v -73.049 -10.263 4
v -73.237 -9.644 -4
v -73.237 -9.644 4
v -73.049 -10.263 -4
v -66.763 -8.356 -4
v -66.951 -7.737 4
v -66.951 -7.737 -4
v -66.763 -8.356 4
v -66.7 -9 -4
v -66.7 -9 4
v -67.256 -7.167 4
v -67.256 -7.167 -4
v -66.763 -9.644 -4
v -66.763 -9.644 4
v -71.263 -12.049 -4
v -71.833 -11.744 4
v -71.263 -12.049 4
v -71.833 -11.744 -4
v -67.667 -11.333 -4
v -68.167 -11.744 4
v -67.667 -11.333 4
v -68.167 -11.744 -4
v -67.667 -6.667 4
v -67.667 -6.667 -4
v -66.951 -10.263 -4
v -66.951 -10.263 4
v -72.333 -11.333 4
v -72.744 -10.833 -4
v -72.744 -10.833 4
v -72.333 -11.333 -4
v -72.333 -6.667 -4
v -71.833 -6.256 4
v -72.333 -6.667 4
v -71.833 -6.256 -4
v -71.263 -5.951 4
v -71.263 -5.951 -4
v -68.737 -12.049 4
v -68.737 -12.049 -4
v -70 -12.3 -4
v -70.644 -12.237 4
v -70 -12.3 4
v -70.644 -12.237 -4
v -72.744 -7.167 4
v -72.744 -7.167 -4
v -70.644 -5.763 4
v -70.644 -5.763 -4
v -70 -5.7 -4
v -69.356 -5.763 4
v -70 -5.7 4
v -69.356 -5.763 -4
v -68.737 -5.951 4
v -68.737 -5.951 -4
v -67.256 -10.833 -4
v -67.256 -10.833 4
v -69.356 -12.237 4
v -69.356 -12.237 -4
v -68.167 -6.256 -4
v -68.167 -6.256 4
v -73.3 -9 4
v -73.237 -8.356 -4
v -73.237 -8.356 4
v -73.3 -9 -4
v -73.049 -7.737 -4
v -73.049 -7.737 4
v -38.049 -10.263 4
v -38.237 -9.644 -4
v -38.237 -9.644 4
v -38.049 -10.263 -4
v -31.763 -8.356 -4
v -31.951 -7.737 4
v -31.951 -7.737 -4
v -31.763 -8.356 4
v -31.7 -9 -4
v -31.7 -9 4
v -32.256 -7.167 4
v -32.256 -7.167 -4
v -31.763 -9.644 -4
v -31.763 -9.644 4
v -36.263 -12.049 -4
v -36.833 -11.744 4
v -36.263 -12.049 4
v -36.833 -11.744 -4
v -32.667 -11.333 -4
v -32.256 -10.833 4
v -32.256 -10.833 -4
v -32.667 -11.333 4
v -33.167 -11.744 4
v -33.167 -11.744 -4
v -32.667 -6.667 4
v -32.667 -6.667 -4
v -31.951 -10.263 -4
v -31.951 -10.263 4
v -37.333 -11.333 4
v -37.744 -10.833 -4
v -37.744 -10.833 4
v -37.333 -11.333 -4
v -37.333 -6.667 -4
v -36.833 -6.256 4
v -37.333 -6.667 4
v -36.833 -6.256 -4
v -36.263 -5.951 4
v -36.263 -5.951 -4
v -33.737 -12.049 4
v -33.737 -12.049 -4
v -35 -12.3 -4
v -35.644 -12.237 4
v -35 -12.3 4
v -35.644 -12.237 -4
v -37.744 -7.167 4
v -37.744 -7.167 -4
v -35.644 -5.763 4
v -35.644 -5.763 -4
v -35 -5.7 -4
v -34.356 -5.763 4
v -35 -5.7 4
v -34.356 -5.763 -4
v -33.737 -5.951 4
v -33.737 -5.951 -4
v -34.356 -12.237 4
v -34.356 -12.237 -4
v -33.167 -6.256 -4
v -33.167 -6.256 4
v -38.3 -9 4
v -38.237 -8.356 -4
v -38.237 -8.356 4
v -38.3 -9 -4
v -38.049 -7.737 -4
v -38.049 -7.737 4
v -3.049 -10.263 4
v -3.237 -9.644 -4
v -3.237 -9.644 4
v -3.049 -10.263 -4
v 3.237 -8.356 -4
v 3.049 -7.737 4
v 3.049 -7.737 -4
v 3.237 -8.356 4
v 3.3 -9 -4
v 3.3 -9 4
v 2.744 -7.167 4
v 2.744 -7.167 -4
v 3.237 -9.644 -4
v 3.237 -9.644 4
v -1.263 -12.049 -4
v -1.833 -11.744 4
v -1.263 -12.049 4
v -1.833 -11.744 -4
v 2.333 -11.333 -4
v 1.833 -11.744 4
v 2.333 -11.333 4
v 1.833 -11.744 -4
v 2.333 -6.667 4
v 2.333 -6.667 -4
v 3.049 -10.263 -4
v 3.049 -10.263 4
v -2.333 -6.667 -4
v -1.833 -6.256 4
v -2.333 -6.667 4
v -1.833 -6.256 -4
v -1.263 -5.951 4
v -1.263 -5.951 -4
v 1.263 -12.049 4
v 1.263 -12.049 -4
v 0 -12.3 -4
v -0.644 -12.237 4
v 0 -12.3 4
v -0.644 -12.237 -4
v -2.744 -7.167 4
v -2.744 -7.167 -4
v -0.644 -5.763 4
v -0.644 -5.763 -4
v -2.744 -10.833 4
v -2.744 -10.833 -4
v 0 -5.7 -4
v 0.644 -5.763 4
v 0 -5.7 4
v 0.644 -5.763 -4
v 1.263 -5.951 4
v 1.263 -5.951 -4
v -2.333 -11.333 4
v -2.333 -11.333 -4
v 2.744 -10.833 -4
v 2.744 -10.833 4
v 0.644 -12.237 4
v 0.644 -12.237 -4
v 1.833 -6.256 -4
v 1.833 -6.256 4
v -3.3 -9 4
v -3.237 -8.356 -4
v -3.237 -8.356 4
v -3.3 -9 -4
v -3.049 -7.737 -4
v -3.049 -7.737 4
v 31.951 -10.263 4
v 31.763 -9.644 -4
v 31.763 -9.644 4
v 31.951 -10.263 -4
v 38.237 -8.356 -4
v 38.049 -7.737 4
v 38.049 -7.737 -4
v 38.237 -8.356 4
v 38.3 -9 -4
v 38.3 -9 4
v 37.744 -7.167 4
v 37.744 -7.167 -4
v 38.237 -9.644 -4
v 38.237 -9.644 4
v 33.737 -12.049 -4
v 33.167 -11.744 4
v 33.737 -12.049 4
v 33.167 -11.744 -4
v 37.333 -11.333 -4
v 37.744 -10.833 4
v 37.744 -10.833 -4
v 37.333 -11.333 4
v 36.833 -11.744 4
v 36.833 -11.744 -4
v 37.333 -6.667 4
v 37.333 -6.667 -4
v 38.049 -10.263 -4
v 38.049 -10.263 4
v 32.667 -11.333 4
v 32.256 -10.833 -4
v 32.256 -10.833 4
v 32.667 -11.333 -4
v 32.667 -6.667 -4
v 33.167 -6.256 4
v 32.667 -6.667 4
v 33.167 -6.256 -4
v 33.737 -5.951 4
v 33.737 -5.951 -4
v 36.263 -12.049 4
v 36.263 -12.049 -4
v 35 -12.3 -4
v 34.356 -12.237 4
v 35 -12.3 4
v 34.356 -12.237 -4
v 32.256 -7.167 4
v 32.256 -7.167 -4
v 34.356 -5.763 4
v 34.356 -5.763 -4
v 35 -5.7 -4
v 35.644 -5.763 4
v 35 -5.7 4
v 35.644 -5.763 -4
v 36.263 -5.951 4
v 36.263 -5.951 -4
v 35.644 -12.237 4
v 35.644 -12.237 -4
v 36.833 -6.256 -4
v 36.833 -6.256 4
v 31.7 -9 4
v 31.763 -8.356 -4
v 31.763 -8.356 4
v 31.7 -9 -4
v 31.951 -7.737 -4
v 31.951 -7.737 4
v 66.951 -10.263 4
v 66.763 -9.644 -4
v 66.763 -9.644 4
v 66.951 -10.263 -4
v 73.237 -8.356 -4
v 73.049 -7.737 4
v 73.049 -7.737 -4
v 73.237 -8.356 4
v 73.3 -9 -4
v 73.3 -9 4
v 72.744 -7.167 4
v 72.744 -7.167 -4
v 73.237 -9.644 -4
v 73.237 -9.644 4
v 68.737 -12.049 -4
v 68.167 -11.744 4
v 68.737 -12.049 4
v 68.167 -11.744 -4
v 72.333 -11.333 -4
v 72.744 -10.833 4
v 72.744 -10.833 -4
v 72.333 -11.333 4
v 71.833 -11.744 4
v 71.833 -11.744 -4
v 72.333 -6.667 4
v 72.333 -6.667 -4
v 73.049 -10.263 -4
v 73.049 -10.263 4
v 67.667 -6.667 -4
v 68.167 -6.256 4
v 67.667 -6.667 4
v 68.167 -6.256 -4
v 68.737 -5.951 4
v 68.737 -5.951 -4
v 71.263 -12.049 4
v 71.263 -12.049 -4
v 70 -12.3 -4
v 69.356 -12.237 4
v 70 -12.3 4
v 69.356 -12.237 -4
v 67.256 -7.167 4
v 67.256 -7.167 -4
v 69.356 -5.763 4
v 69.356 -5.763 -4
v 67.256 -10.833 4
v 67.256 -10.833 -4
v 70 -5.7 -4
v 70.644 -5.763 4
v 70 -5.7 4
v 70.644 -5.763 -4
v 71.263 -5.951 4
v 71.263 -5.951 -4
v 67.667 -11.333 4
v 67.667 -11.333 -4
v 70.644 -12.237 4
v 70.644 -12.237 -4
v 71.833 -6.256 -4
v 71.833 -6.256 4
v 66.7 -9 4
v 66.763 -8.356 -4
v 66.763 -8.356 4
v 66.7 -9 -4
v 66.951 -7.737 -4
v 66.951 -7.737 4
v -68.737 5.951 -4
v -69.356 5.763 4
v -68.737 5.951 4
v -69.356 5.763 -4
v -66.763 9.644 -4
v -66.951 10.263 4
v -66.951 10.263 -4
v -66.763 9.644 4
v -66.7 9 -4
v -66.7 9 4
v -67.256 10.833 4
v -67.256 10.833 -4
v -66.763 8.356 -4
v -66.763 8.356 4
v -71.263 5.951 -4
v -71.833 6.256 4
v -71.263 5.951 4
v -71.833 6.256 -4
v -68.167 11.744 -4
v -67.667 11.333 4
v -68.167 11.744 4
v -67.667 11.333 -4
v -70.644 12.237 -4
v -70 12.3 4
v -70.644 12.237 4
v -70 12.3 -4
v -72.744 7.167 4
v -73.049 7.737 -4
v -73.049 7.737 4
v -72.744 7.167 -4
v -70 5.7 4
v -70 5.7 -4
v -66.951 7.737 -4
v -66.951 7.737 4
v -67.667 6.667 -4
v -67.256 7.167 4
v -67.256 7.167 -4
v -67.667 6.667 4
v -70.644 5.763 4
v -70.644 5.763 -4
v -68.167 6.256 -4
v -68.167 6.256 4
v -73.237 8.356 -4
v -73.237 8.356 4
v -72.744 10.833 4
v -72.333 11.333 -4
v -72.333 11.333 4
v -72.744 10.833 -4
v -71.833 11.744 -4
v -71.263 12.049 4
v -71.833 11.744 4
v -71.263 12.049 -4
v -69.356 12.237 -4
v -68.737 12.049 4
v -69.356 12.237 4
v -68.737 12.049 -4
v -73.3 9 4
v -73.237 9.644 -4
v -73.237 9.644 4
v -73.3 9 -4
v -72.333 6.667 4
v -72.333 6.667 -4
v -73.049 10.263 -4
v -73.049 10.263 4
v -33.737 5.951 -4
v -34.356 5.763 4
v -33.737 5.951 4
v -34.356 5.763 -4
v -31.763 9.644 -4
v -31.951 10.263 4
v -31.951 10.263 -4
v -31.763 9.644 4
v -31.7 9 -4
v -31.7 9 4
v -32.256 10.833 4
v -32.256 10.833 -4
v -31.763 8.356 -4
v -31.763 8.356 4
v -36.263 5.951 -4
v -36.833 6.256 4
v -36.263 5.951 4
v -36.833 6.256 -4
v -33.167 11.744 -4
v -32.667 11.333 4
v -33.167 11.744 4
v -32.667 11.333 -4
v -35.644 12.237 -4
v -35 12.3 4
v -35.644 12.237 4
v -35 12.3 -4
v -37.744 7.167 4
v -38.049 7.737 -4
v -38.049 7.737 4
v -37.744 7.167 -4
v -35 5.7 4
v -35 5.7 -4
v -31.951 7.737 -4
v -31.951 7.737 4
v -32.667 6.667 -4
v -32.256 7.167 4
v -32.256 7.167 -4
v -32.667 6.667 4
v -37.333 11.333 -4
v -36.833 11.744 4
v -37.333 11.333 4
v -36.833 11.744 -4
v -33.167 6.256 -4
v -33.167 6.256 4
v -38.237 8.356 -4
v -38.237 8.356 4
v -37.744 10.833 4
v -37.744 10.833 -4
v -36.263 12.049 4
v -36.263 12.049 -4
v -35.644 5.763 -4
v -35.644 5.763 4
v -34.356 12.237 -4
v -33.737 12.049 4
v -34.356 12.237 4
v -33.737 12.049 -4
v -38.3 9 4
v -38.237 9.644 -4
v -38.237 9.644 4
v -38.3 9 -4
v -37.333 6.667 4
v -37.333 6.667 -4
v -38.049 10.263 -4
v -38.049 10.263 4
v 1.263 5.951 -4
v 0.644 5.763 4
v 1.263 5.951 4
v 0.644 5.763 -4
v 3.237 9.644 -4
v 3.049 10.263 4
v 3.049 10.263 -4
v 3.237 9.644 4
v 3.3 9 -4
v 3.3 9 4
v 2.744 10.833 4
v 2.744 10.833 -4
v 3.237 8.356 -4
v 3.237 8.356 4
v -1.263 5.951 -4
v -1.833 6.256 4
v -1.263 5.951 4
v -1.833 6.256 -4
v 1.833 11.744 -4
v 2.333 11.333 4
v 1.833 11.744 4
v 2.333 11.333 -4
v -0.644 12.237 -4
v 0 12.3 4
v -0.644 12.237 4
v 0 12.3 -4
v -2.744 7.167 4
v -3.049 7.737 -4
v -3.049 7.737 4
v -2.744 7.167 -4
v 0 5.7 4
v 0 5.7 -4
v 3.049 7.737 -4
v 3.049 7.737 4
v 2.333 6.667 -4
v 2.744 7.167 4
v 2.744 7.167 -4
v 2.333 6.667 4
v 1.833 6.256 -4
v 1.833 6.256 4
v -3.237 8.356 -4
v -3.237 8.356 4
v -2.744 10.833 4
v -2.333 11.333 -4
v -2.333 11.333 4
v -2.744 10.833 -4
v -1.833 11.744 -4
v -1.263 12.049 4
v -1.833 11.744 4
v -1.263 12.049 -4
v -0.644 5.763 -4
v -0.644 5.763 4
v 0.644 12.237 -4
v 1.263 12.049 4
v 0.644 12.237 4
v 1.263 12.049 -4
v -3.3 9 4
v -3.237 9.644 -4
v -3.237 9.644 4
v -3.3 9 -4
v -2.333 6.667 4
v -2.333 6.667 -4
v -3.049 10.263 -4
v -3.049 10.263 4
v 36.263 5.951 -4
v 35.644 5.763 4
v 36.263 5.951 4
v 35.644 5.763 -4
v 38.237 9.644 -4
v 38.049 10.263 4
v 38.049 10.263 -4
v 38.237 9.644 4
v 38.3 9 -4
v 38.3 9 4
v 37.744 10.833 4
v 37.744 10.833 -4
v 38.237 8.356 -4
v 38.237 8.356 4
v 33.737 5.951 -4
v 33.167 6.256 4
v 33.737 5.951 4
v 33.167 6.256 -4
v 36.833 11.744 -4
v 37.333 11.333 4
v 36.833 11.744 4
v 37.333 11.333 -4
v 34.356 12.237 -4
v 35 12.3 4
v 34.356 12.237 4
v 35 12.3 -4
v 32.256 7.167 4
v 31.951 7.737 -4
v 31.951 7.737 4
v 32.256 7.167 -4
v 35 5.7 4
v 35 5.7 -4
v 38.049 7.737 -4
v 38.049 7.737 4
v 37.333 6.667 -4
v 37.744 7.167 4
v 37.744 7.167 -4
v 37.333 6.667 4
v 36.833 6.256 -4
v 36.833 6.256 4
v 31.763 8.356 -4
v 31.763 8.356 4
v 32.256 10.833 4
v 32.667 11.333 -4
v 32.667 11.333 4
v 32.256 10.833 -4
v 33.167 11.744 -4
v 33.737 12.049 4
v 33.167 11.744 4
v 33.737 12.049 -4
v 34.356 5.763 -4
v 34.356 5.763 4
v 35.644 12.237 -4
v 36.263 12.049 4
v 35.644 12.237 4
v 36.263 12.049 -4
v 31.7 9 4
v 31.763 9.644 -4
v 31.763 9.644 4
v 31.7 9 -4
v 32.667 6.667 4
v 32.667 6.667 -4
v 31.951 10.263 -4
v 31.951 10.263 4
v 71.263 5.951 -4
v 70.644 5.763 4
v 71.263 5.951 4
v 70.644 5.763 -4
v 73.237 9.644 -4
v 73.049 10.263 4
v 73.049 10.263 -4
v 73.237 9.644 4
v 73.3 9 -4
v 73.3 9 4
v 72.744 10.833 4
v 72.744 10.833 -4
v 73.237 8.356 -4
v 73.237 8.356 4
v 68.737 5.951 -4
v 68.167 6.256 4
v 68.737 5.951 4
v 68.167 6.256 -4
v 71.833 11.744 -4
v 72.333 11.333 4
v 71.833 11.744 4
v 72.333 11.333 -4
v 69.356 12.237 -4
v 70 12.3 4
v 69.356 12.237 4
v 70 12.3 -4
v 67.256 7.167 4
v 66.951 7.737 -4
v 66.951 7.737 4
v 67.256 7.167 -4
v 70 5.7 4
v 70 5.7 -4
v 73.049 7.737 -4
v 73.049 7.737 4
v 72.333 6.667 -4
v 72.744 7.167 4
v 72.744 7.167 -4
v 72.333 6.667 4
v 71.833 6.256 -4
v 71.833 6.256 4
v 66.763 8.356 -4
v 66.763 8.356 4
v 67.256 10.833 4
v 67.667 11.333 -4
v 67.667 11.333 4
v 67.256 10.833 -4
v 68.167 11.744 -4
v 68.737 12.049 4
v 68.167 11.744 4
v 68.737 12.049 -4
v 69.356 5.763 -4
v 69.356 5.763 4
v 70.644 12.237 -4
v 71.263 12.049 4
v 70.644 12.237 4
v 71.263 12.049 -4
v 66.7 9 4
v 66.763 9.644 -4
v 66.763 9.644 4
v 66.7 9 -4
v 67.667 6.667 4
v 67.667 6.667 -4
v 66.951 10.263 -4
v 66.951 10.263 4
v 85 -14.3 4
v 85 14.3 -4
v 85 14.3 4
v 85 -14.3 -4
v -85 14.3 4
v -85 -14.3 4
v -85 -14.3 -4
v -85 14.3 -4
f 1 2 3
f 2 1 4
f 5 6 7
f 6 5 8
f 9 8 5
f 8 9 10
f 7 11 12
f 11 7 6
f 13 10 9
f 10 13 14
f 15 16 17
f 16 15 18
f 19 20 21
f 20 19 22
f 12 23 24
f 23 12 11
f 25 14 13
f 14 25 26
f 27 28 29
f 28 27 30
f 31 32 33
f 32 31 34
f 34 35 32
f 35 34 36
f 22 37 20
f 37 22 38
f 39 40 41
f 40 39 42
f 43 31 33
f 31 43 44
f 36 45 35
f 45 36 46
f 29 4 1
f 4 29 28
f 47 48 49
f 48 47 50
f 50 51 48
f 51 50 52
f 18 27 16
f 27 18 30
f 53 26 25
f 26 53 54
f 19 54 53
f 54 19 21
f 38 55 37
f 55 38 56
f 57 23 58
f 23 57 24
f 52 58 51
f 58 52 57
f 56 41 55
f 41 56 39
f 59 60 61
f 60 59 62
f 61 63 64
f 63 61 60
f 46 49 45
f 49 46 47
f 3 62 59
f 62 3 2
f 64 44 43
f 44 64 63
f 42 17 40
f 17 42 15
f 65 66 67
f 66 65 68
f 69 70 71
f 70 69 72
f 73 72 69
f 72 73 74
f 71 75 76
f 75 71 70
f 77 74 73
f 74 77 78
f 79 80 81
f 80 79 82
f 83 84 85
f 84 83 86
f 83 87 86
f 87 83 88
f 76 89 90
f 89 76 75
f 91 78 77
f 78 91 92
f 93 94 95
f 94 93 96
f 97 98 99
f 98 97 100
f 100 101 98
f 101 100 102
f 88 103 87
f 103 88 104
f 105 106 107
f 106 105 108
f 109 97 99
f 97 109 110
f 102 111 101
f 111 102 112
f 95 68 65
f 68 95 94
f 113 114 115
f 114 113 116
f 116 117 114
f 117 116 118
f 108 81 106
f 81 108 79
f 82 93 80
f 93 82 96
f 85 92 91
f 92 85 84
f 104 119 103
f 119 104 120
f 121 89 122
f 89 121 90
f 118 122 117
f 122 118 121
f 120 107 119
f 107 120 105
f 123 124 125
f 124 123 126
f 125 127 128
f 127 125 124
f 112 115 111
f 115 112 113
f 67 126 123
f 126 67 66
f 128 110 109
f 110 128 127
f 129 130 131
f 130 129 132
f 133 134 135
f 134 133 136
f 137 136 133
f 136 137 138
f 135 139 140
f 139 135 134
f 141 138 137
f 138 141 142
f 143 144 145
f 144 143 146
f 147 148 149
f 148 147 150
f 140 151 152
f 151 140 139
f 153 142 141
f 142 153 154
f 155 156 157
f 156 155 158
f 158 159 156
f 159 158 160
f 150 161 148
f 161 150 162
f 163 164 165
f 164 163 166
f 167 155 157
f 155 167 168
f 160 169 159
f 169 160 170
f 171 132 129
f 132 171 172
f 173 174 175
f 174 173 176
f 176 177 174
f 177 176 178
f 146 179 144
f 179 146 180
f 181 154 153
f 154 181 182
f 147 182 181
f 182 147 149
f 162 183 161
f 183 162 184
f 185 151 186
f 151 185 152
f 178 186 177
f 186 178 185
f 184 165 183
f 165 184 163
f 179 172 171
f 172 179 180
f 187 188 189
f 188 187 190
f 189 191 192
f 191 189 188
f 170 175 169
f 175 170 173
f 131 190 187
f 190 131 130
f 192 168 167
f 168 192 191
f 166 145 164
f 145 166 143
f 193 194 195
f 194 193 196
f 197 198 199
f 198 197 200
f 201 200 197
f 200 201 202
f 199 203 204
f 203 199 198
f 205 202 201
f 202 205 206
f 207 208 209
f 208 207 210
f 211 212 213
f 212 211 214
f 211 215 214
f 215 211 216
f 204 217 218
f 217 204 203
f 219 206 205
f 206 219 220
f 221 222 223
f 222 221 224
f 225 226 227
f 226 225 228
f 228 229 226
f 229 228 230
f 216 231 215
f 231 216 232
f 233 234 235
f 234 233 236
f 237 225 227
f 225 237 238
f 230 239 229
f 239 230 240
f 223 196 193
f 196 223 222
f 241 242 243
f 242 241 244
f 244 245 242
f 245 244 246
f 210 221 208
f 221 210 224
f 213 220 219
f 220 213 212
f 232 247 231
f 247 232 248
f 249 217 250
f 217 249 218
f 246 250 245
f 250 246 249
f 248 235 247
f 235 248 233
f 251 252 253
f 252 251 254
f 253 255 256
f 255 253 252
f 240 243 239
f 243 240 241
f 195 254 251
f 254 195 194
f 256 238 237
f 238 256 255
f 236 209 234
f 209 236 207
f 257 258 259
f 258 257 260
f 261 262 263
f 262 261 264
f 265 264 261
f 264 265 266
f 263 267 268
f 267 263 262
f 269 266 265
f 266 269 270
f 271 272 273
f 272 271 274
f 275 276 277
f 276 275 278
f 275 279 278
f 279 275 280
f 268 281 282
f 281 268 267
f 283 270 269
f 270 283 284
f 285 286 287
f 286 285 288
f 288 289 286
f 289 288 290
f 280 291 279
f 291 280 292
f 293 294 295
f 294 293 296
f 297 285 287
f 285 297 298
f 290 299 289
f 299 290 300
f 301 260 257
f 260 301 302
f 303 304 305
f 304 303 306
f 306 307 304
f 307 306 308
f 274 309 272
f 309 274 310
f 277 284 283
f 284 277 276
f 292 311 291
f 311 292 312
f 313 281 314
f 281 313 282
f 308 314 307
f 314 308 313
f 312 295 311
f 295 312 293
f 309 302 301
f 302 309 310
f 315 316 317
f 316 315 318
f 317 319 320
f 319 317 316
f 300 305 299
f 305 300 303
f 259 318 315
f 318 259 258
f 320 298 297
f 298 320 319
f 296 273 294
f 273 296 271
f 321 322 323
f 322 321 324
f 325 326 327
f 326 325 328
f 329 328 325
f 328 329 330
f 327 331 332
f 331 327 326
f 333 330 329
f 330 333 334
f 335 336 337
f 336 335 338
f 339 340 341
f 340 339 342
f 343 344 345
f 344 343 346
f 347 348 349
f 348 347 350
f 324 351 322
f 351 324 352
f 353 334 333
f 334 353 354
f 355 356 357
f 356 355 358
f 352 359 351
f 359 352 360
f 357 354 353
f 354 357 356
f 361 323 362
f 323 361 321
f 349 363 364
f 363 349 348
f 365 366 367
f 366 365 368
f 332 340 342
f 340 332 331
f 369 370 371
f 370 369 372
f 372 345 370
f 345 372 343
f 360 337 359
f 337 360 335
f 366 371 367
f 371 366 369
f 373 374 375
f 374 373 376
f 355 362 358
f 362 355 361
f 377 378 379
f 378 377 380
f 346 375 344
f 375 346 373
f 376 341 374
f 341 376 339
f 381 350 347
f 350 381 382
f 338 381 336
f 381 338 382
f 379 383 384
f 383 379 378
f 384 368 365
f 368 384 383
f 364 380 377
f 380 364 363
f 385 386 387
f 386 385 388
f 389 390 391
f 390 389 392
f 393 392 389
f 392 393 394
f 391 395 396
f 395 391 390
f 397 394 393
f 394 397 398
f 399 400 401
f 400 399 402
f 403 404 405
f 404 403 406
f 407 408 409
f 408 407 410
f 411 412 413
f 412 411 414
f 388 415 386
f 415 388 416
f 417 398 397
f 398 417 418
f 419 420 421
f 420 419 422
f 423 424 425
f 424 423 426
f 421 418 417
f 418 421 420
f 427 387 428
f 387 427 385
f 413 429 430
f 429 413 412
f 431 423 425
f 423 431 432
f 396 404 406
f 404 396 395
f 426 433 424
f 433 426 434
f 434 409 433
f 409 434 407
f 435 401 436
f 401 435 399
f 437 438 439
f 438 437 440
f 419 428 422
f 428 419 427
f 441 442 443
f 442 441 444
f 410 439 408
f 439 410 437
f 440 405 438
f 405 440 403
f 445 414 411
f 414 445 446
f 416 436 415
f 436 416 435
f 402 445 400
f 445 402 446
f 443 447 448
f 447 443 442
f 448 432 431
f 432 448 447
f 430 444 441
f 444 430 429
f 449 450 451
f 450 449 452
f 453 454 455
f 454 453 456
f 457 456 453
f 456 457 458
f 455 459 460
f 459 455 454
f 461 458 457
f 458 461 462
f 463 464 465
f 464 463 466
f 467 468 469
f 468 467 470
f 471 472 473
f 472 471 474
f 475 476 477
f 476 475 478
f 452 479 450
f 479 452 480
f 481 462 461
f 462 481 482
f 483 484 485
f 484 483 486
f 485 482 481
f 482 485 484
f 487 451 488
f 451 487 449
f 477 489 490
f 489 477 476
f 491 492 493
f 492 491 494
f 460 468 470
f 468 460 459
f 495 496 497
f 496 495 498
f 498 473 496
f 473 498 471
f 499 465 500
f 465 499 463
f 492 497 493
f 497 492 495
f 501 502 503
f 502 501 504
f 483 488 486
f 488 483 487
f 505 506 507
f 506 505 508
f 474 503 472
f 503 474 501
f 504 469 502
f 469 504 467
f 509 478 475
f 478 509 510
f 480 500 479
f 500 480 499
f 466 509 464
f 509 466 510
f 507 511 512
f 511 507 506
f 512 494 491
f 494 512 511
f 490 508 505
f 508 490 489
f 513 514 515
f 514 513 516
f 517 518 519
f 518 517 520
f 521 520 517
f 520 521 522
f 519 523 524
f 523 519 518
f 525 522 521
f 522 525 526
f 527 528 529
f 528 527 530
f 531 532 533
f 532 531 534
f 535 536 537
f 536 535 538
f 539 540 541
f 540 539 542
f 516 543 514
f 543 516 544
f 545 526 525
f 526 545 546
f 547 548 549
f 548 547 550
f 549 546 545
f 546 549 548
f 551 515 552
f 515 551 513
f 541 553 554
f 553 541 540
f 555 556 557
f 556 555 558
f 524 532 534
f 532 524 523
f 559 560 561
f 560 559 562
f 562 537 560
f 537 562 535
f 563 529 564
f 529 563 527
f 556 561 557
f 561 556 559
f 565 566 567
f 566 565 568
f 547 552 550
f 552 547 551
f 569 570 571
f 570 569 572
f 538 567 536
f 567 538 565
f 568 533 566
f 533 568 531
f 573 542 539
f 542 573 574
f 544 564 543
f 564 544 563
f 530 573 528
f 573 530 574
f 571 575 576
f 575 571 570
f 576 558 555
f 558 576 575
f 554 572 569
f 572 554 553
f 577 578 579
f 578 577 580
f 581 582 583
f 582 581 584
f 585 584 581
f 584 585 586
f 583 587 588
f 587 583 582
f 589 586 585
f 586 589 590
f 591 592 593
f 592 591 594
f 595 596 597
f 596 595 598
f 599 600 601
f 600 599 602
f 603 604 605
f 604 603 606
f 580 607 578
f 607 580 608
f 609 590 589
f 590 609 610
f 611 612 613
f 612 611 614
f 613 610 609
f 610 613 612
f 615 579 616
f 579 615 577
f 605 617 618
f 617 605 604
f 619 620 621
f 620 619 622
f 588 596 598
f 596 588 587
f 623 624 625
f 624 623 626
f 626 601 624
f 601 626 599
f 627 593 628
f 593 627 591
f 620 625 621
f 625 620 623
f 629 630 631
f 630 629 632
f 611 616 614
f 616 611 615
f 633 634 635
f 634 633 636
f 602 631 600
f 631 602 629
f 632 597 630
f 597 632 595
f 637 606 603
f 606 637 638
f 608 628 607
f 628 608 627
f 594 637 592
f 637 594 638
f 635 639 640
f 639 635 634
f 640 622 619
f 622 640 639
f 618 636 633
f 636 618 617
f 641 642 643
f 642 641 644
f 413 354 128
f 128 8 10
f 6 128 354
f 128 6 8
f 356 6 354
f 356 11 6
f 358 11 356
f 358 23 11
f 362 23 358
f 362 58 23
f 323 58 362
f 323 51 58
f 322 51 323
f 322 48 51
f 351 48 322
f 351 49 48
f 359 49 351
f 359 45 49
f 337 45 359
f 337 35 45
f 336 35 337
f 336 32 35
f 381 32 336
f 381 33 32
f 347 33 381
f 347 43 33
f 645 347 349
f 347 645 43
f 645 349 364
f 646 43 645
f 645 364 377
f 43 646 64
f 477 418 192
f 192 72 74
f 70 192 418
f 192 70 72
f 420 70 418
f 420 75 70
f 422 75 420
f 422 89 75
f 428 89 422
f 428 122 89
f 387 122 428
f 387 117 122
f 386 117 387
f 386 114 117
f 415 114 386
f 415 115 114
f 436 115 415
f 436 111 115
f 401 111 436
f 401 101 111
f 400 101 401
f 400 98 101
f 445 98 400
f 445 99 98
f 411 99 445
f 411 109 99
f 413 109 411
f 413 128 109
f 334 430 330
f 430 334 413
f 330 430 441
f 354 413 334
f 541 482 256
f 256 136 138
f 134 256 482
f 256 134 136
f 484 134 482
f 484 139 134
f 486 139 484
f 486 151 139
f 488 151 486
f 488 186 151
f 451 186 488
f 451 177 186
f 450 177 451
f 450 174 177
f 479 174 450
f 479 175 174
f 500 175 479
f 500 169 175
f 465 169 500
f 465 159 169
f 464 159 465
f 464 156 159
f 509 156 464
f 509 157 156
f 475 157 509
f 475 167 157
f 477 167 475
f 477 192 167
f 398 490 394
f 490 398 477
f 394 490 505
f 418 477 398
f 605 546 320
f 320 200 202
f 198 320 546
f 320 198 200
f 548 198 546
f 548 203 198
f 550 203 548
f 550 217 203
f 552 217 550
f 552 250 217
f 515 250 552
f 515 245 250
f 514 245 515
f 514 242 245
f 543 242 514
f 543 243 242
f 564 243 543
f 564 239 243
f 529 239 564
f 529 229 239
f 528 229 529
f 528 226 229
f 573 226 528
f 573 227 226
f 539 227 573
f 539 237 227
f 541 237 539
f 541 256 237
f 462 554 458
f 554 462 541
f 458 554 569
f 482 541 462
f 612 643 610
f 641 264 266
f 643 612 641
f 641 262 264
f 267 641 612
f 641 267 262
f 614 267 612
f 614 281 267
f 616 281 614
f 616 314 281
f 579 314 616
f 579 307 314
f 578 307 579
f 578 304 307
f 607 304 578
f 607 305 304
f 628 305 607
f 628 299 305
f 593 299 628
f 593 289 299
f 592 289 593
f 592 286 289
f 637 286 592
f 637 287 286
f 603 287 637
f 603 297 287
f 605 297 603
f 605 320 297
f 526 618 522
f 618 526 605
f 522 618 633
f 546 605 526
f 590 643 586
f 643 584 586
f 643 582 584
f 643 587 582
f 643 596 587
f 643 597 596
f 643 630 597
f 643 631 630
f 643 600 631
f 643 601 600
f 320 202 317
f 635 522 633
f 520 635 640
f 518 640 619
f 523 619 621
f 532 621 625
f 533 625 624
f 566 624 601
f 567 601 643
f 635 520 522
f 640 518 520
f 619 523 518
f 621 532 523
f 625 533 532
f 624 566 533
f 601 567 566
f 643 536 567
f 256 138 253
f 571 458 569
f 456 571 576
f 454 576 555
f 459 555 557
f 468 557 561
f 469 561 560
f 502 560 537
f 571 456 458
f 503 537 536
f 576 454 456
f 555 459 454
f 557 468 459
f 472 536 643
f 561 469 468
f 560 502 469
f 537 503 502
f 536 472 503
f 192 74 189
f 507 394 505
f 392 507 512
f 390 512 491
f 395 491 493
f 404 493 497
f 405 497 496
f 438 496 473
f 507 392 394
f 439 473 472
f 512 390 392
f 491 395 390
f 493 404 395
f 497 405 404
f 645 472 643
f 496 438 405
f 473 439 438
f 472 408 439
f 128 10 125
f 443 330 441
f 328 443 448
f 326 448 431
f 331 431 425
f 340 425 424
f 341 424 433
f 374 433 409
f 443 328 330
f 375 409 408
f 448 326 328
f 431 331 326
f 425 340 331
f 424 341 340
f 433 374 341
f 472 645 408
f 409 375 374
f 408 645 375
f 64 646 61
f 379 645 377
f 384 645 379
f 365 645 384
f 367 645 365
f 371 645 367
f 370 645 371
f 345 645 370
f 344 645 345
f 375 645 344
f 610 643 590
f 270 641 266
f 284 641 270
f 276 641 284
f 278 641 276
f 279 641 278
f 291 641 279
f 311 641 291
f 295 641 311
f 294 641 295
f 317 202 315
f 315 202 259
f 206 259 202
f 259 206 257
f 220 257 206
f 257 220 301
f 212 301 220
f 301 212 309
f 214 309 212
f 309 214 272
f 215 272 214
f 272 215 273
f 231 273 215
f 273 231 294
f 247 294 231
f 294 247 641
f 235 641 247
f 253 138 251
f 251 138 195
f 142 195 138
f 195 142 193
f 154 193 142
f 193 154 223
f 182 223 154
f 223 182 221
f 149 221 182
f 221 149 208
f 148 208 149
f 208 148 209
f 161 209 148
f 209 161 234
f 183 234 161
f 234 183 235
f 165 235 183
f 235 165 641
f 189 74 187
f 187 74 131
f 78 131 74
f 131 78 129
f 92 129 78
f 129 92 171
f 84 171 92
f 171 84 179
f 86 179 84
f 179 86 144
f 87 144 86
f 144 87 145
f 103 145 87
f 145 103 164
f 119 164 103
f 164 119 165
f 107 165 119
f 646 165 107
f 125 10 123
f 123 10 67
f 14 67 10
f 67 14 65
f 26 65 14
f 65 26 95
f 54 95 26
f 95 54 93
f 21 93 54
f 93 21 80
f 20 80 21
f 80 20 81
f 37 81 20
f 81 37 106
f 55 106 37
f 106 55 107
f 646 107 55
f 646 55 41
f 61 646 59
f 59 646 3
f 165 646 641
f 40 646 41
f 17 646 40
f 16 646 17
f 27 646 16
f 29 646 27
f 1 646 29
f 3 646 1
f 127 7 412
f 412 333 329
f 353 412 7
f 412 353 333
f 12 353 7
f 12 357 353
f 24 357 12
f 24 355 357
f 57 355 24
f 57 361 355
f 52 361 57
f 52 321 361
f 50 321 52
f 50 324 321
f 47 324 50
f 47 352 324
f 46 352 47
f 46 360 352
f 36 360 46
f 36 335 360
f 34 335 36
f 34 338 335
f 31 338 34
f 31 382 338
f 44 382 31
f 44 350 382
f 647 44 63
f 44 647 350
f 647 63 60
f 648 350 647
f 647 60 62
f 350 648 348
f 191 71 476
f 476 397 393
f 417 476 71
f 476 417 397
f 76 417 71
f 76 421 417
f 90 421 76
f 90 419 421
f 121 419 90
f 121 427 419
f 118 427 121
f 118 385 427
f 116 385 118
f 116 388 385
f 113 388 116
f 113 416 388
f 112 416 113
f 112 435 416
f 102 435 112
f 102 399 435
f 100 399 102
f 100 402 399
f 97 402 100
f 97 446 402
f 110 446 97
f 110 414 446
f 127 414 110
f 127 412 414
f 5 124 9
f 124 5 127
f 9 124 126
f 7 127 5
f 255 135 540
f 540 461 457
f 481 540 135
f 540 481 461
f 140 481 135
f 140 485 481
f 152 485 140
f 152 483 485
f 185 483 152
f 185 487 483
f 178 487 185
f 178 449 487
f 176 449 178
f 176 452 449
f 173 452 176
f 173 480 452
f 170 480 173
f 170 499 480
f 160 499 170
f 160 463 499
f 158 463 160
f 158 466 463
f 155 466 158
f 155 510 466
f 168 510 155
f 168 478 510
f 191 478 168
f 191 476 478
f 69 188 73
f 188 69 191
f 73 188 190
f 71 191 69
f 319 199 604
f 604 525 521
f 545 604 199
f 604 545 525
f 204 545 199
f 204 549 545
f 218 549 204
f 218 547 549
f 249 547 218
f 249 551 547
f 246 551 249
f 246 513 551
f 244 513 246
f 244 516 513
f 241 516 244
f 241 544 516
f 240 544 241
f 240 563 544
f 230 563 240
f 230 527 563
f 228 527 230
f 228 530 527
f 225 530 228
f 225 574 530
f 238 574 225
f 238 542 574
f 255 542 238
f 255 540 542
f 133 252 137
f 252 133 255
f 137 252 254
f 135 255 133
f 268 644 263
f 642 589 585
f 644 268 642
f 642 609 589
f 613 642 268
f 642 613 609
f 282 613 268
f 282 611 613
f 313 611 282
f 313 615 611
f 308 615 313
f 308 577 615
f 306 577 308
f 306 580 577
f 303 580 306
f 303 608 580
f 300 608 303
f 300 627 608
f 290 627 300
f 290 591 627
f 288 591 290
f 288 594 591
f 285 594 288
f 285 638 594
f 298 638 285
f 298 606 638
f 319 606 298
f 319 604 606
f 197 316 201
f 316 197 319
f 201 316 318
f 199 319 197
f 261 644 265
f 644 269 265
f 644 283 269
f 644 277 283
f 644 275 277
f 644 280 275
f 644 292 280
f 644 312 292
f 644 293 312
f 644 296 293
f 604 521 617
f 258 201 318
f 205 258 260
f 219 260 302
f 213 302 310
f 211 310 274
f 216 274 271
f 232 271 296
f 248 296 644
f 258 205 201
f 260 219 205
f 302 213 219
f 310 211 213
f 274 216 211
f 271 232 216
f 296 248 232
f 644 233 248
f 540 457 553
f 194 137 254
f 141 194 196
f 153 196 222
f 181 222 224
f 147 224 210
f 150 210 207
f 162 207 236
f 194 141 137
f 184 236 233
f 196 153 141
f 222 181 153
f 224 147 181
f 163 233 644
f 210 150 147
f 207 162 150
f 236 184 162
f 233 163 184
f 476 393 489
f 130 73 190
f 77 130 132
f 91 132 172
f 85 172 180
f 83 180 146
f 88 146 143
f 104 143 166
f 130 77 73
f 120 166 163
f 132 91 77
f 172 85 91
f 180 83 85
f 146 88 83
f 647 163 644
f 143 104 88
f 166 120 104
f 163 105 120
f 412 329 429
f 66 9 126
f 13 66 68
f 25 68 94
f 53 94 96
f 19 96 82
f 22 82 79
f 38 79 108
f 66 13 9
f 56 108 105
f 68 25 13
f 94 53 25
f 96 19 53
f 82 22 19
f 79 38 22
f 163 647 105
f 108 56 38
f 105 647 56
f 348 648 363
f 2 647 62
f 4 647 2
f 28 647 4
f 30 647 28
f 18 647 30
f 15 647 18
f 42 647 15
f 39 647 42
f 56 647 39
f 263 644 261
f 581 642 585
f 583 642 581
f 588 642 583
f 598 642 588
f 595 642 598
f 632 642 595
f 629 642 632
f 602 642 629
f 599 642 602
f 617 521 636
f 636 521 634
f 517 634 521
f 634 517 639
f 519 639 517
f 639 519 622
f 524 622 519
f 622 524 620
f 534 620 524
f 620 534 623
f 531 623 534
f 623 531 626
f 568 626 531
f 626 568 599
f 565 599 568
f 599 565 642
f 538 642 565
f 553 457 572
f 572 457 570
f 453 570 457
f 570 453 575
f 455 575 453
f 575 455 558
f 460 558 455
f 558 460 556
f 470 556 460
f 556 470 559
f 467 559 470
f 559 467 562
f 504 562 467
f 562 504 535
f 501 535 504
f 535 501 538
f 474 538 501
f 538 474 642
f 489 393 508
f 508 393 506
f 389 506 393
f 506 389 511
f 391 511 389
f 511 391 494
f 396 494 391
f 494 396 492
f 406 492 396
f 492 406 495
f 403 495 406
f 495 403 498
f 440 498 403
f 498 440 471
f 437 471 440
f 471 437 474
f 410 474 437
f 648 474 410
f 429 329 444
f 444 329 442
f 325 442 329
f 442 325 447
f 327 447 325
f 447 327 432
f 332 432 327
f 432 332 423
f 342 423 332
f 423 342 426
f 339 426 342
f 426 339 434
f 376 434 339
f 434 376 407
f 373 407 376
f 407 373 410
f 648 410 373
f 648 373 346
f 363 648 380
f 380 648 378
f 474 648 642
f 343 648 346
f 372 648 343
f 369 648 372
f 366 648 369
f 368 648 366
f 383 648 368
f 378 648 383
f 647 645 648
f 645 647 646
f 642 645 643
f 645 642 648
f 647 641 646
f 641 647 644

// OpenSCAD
$fn = 32;

// ----------------------------------------------------------------------
// Hole bar, 5 x Ø6.6
// tworows layout, 15 mm edge offset
// ----------------------------------------------------------------------

// --- parameters (mm) ---
bar_w = 28.6;     // bar width (Y)
bar_t = 8;        // bar thickness (Z)
holes = 5;        // holes per row
hole_d = 6.6;     // hole diameter
edge = 15;        // offset from the bar end to the first hole
pitch = 35;       // pitch between neighbouring holes
row_offset = 18;  // distance between the two rows

// --- derived feature positions (mm) ---
span = (holes - 1) * pitch;   // = 140   distance between the end holes
bar_l = span + 2 * edge;      // = 170   overall bar length
start_x = -bar_l / 2 + edge;  // = -70   X of the first hole
feature_centers = [
  [start_x + 0 * pitch, -row_offset / 2],
  [start_x + 1 * pitch, -row_offset / 2],
  [start_x + 2 * pitch, -row_offset / 2],
  [start_x + 3 * pitch, -row_offset / 2],
  [start_x + 4 * pitch, -row_offset / 2]
];   // hole centres of the first row
row2_centers = [
  [start_x + 0 * pitch, row_offset / 2],
  [start_x + 1 * pitch, row_offset / 2],
  [start_x + 2 * pitch, row_offset / 2],
  [start_x + 3 * pitch, row_offset / 2],
  [start_x + 4 * pitch, row_offset / 2]
];   // hole centres of the second row

// bar with two rows of holes, both read from their own centre arrays
difference() {
  translate([-bar_l / 2, -bar_w / 2, -bar_t / 2]) cube([bar_l, bar_w, bar_t]);
  for (centre = feature_centers)
    translate([centre[0], centre[1], 0])
      cylinder(d = hole_d, h = bar_t + 2, center = true);
  for (centre = row2_centers)
    translate([centre[0], centre[1], 0])
      cylinder(d = hole_d, h = bar_t + 2, center = true);
}
